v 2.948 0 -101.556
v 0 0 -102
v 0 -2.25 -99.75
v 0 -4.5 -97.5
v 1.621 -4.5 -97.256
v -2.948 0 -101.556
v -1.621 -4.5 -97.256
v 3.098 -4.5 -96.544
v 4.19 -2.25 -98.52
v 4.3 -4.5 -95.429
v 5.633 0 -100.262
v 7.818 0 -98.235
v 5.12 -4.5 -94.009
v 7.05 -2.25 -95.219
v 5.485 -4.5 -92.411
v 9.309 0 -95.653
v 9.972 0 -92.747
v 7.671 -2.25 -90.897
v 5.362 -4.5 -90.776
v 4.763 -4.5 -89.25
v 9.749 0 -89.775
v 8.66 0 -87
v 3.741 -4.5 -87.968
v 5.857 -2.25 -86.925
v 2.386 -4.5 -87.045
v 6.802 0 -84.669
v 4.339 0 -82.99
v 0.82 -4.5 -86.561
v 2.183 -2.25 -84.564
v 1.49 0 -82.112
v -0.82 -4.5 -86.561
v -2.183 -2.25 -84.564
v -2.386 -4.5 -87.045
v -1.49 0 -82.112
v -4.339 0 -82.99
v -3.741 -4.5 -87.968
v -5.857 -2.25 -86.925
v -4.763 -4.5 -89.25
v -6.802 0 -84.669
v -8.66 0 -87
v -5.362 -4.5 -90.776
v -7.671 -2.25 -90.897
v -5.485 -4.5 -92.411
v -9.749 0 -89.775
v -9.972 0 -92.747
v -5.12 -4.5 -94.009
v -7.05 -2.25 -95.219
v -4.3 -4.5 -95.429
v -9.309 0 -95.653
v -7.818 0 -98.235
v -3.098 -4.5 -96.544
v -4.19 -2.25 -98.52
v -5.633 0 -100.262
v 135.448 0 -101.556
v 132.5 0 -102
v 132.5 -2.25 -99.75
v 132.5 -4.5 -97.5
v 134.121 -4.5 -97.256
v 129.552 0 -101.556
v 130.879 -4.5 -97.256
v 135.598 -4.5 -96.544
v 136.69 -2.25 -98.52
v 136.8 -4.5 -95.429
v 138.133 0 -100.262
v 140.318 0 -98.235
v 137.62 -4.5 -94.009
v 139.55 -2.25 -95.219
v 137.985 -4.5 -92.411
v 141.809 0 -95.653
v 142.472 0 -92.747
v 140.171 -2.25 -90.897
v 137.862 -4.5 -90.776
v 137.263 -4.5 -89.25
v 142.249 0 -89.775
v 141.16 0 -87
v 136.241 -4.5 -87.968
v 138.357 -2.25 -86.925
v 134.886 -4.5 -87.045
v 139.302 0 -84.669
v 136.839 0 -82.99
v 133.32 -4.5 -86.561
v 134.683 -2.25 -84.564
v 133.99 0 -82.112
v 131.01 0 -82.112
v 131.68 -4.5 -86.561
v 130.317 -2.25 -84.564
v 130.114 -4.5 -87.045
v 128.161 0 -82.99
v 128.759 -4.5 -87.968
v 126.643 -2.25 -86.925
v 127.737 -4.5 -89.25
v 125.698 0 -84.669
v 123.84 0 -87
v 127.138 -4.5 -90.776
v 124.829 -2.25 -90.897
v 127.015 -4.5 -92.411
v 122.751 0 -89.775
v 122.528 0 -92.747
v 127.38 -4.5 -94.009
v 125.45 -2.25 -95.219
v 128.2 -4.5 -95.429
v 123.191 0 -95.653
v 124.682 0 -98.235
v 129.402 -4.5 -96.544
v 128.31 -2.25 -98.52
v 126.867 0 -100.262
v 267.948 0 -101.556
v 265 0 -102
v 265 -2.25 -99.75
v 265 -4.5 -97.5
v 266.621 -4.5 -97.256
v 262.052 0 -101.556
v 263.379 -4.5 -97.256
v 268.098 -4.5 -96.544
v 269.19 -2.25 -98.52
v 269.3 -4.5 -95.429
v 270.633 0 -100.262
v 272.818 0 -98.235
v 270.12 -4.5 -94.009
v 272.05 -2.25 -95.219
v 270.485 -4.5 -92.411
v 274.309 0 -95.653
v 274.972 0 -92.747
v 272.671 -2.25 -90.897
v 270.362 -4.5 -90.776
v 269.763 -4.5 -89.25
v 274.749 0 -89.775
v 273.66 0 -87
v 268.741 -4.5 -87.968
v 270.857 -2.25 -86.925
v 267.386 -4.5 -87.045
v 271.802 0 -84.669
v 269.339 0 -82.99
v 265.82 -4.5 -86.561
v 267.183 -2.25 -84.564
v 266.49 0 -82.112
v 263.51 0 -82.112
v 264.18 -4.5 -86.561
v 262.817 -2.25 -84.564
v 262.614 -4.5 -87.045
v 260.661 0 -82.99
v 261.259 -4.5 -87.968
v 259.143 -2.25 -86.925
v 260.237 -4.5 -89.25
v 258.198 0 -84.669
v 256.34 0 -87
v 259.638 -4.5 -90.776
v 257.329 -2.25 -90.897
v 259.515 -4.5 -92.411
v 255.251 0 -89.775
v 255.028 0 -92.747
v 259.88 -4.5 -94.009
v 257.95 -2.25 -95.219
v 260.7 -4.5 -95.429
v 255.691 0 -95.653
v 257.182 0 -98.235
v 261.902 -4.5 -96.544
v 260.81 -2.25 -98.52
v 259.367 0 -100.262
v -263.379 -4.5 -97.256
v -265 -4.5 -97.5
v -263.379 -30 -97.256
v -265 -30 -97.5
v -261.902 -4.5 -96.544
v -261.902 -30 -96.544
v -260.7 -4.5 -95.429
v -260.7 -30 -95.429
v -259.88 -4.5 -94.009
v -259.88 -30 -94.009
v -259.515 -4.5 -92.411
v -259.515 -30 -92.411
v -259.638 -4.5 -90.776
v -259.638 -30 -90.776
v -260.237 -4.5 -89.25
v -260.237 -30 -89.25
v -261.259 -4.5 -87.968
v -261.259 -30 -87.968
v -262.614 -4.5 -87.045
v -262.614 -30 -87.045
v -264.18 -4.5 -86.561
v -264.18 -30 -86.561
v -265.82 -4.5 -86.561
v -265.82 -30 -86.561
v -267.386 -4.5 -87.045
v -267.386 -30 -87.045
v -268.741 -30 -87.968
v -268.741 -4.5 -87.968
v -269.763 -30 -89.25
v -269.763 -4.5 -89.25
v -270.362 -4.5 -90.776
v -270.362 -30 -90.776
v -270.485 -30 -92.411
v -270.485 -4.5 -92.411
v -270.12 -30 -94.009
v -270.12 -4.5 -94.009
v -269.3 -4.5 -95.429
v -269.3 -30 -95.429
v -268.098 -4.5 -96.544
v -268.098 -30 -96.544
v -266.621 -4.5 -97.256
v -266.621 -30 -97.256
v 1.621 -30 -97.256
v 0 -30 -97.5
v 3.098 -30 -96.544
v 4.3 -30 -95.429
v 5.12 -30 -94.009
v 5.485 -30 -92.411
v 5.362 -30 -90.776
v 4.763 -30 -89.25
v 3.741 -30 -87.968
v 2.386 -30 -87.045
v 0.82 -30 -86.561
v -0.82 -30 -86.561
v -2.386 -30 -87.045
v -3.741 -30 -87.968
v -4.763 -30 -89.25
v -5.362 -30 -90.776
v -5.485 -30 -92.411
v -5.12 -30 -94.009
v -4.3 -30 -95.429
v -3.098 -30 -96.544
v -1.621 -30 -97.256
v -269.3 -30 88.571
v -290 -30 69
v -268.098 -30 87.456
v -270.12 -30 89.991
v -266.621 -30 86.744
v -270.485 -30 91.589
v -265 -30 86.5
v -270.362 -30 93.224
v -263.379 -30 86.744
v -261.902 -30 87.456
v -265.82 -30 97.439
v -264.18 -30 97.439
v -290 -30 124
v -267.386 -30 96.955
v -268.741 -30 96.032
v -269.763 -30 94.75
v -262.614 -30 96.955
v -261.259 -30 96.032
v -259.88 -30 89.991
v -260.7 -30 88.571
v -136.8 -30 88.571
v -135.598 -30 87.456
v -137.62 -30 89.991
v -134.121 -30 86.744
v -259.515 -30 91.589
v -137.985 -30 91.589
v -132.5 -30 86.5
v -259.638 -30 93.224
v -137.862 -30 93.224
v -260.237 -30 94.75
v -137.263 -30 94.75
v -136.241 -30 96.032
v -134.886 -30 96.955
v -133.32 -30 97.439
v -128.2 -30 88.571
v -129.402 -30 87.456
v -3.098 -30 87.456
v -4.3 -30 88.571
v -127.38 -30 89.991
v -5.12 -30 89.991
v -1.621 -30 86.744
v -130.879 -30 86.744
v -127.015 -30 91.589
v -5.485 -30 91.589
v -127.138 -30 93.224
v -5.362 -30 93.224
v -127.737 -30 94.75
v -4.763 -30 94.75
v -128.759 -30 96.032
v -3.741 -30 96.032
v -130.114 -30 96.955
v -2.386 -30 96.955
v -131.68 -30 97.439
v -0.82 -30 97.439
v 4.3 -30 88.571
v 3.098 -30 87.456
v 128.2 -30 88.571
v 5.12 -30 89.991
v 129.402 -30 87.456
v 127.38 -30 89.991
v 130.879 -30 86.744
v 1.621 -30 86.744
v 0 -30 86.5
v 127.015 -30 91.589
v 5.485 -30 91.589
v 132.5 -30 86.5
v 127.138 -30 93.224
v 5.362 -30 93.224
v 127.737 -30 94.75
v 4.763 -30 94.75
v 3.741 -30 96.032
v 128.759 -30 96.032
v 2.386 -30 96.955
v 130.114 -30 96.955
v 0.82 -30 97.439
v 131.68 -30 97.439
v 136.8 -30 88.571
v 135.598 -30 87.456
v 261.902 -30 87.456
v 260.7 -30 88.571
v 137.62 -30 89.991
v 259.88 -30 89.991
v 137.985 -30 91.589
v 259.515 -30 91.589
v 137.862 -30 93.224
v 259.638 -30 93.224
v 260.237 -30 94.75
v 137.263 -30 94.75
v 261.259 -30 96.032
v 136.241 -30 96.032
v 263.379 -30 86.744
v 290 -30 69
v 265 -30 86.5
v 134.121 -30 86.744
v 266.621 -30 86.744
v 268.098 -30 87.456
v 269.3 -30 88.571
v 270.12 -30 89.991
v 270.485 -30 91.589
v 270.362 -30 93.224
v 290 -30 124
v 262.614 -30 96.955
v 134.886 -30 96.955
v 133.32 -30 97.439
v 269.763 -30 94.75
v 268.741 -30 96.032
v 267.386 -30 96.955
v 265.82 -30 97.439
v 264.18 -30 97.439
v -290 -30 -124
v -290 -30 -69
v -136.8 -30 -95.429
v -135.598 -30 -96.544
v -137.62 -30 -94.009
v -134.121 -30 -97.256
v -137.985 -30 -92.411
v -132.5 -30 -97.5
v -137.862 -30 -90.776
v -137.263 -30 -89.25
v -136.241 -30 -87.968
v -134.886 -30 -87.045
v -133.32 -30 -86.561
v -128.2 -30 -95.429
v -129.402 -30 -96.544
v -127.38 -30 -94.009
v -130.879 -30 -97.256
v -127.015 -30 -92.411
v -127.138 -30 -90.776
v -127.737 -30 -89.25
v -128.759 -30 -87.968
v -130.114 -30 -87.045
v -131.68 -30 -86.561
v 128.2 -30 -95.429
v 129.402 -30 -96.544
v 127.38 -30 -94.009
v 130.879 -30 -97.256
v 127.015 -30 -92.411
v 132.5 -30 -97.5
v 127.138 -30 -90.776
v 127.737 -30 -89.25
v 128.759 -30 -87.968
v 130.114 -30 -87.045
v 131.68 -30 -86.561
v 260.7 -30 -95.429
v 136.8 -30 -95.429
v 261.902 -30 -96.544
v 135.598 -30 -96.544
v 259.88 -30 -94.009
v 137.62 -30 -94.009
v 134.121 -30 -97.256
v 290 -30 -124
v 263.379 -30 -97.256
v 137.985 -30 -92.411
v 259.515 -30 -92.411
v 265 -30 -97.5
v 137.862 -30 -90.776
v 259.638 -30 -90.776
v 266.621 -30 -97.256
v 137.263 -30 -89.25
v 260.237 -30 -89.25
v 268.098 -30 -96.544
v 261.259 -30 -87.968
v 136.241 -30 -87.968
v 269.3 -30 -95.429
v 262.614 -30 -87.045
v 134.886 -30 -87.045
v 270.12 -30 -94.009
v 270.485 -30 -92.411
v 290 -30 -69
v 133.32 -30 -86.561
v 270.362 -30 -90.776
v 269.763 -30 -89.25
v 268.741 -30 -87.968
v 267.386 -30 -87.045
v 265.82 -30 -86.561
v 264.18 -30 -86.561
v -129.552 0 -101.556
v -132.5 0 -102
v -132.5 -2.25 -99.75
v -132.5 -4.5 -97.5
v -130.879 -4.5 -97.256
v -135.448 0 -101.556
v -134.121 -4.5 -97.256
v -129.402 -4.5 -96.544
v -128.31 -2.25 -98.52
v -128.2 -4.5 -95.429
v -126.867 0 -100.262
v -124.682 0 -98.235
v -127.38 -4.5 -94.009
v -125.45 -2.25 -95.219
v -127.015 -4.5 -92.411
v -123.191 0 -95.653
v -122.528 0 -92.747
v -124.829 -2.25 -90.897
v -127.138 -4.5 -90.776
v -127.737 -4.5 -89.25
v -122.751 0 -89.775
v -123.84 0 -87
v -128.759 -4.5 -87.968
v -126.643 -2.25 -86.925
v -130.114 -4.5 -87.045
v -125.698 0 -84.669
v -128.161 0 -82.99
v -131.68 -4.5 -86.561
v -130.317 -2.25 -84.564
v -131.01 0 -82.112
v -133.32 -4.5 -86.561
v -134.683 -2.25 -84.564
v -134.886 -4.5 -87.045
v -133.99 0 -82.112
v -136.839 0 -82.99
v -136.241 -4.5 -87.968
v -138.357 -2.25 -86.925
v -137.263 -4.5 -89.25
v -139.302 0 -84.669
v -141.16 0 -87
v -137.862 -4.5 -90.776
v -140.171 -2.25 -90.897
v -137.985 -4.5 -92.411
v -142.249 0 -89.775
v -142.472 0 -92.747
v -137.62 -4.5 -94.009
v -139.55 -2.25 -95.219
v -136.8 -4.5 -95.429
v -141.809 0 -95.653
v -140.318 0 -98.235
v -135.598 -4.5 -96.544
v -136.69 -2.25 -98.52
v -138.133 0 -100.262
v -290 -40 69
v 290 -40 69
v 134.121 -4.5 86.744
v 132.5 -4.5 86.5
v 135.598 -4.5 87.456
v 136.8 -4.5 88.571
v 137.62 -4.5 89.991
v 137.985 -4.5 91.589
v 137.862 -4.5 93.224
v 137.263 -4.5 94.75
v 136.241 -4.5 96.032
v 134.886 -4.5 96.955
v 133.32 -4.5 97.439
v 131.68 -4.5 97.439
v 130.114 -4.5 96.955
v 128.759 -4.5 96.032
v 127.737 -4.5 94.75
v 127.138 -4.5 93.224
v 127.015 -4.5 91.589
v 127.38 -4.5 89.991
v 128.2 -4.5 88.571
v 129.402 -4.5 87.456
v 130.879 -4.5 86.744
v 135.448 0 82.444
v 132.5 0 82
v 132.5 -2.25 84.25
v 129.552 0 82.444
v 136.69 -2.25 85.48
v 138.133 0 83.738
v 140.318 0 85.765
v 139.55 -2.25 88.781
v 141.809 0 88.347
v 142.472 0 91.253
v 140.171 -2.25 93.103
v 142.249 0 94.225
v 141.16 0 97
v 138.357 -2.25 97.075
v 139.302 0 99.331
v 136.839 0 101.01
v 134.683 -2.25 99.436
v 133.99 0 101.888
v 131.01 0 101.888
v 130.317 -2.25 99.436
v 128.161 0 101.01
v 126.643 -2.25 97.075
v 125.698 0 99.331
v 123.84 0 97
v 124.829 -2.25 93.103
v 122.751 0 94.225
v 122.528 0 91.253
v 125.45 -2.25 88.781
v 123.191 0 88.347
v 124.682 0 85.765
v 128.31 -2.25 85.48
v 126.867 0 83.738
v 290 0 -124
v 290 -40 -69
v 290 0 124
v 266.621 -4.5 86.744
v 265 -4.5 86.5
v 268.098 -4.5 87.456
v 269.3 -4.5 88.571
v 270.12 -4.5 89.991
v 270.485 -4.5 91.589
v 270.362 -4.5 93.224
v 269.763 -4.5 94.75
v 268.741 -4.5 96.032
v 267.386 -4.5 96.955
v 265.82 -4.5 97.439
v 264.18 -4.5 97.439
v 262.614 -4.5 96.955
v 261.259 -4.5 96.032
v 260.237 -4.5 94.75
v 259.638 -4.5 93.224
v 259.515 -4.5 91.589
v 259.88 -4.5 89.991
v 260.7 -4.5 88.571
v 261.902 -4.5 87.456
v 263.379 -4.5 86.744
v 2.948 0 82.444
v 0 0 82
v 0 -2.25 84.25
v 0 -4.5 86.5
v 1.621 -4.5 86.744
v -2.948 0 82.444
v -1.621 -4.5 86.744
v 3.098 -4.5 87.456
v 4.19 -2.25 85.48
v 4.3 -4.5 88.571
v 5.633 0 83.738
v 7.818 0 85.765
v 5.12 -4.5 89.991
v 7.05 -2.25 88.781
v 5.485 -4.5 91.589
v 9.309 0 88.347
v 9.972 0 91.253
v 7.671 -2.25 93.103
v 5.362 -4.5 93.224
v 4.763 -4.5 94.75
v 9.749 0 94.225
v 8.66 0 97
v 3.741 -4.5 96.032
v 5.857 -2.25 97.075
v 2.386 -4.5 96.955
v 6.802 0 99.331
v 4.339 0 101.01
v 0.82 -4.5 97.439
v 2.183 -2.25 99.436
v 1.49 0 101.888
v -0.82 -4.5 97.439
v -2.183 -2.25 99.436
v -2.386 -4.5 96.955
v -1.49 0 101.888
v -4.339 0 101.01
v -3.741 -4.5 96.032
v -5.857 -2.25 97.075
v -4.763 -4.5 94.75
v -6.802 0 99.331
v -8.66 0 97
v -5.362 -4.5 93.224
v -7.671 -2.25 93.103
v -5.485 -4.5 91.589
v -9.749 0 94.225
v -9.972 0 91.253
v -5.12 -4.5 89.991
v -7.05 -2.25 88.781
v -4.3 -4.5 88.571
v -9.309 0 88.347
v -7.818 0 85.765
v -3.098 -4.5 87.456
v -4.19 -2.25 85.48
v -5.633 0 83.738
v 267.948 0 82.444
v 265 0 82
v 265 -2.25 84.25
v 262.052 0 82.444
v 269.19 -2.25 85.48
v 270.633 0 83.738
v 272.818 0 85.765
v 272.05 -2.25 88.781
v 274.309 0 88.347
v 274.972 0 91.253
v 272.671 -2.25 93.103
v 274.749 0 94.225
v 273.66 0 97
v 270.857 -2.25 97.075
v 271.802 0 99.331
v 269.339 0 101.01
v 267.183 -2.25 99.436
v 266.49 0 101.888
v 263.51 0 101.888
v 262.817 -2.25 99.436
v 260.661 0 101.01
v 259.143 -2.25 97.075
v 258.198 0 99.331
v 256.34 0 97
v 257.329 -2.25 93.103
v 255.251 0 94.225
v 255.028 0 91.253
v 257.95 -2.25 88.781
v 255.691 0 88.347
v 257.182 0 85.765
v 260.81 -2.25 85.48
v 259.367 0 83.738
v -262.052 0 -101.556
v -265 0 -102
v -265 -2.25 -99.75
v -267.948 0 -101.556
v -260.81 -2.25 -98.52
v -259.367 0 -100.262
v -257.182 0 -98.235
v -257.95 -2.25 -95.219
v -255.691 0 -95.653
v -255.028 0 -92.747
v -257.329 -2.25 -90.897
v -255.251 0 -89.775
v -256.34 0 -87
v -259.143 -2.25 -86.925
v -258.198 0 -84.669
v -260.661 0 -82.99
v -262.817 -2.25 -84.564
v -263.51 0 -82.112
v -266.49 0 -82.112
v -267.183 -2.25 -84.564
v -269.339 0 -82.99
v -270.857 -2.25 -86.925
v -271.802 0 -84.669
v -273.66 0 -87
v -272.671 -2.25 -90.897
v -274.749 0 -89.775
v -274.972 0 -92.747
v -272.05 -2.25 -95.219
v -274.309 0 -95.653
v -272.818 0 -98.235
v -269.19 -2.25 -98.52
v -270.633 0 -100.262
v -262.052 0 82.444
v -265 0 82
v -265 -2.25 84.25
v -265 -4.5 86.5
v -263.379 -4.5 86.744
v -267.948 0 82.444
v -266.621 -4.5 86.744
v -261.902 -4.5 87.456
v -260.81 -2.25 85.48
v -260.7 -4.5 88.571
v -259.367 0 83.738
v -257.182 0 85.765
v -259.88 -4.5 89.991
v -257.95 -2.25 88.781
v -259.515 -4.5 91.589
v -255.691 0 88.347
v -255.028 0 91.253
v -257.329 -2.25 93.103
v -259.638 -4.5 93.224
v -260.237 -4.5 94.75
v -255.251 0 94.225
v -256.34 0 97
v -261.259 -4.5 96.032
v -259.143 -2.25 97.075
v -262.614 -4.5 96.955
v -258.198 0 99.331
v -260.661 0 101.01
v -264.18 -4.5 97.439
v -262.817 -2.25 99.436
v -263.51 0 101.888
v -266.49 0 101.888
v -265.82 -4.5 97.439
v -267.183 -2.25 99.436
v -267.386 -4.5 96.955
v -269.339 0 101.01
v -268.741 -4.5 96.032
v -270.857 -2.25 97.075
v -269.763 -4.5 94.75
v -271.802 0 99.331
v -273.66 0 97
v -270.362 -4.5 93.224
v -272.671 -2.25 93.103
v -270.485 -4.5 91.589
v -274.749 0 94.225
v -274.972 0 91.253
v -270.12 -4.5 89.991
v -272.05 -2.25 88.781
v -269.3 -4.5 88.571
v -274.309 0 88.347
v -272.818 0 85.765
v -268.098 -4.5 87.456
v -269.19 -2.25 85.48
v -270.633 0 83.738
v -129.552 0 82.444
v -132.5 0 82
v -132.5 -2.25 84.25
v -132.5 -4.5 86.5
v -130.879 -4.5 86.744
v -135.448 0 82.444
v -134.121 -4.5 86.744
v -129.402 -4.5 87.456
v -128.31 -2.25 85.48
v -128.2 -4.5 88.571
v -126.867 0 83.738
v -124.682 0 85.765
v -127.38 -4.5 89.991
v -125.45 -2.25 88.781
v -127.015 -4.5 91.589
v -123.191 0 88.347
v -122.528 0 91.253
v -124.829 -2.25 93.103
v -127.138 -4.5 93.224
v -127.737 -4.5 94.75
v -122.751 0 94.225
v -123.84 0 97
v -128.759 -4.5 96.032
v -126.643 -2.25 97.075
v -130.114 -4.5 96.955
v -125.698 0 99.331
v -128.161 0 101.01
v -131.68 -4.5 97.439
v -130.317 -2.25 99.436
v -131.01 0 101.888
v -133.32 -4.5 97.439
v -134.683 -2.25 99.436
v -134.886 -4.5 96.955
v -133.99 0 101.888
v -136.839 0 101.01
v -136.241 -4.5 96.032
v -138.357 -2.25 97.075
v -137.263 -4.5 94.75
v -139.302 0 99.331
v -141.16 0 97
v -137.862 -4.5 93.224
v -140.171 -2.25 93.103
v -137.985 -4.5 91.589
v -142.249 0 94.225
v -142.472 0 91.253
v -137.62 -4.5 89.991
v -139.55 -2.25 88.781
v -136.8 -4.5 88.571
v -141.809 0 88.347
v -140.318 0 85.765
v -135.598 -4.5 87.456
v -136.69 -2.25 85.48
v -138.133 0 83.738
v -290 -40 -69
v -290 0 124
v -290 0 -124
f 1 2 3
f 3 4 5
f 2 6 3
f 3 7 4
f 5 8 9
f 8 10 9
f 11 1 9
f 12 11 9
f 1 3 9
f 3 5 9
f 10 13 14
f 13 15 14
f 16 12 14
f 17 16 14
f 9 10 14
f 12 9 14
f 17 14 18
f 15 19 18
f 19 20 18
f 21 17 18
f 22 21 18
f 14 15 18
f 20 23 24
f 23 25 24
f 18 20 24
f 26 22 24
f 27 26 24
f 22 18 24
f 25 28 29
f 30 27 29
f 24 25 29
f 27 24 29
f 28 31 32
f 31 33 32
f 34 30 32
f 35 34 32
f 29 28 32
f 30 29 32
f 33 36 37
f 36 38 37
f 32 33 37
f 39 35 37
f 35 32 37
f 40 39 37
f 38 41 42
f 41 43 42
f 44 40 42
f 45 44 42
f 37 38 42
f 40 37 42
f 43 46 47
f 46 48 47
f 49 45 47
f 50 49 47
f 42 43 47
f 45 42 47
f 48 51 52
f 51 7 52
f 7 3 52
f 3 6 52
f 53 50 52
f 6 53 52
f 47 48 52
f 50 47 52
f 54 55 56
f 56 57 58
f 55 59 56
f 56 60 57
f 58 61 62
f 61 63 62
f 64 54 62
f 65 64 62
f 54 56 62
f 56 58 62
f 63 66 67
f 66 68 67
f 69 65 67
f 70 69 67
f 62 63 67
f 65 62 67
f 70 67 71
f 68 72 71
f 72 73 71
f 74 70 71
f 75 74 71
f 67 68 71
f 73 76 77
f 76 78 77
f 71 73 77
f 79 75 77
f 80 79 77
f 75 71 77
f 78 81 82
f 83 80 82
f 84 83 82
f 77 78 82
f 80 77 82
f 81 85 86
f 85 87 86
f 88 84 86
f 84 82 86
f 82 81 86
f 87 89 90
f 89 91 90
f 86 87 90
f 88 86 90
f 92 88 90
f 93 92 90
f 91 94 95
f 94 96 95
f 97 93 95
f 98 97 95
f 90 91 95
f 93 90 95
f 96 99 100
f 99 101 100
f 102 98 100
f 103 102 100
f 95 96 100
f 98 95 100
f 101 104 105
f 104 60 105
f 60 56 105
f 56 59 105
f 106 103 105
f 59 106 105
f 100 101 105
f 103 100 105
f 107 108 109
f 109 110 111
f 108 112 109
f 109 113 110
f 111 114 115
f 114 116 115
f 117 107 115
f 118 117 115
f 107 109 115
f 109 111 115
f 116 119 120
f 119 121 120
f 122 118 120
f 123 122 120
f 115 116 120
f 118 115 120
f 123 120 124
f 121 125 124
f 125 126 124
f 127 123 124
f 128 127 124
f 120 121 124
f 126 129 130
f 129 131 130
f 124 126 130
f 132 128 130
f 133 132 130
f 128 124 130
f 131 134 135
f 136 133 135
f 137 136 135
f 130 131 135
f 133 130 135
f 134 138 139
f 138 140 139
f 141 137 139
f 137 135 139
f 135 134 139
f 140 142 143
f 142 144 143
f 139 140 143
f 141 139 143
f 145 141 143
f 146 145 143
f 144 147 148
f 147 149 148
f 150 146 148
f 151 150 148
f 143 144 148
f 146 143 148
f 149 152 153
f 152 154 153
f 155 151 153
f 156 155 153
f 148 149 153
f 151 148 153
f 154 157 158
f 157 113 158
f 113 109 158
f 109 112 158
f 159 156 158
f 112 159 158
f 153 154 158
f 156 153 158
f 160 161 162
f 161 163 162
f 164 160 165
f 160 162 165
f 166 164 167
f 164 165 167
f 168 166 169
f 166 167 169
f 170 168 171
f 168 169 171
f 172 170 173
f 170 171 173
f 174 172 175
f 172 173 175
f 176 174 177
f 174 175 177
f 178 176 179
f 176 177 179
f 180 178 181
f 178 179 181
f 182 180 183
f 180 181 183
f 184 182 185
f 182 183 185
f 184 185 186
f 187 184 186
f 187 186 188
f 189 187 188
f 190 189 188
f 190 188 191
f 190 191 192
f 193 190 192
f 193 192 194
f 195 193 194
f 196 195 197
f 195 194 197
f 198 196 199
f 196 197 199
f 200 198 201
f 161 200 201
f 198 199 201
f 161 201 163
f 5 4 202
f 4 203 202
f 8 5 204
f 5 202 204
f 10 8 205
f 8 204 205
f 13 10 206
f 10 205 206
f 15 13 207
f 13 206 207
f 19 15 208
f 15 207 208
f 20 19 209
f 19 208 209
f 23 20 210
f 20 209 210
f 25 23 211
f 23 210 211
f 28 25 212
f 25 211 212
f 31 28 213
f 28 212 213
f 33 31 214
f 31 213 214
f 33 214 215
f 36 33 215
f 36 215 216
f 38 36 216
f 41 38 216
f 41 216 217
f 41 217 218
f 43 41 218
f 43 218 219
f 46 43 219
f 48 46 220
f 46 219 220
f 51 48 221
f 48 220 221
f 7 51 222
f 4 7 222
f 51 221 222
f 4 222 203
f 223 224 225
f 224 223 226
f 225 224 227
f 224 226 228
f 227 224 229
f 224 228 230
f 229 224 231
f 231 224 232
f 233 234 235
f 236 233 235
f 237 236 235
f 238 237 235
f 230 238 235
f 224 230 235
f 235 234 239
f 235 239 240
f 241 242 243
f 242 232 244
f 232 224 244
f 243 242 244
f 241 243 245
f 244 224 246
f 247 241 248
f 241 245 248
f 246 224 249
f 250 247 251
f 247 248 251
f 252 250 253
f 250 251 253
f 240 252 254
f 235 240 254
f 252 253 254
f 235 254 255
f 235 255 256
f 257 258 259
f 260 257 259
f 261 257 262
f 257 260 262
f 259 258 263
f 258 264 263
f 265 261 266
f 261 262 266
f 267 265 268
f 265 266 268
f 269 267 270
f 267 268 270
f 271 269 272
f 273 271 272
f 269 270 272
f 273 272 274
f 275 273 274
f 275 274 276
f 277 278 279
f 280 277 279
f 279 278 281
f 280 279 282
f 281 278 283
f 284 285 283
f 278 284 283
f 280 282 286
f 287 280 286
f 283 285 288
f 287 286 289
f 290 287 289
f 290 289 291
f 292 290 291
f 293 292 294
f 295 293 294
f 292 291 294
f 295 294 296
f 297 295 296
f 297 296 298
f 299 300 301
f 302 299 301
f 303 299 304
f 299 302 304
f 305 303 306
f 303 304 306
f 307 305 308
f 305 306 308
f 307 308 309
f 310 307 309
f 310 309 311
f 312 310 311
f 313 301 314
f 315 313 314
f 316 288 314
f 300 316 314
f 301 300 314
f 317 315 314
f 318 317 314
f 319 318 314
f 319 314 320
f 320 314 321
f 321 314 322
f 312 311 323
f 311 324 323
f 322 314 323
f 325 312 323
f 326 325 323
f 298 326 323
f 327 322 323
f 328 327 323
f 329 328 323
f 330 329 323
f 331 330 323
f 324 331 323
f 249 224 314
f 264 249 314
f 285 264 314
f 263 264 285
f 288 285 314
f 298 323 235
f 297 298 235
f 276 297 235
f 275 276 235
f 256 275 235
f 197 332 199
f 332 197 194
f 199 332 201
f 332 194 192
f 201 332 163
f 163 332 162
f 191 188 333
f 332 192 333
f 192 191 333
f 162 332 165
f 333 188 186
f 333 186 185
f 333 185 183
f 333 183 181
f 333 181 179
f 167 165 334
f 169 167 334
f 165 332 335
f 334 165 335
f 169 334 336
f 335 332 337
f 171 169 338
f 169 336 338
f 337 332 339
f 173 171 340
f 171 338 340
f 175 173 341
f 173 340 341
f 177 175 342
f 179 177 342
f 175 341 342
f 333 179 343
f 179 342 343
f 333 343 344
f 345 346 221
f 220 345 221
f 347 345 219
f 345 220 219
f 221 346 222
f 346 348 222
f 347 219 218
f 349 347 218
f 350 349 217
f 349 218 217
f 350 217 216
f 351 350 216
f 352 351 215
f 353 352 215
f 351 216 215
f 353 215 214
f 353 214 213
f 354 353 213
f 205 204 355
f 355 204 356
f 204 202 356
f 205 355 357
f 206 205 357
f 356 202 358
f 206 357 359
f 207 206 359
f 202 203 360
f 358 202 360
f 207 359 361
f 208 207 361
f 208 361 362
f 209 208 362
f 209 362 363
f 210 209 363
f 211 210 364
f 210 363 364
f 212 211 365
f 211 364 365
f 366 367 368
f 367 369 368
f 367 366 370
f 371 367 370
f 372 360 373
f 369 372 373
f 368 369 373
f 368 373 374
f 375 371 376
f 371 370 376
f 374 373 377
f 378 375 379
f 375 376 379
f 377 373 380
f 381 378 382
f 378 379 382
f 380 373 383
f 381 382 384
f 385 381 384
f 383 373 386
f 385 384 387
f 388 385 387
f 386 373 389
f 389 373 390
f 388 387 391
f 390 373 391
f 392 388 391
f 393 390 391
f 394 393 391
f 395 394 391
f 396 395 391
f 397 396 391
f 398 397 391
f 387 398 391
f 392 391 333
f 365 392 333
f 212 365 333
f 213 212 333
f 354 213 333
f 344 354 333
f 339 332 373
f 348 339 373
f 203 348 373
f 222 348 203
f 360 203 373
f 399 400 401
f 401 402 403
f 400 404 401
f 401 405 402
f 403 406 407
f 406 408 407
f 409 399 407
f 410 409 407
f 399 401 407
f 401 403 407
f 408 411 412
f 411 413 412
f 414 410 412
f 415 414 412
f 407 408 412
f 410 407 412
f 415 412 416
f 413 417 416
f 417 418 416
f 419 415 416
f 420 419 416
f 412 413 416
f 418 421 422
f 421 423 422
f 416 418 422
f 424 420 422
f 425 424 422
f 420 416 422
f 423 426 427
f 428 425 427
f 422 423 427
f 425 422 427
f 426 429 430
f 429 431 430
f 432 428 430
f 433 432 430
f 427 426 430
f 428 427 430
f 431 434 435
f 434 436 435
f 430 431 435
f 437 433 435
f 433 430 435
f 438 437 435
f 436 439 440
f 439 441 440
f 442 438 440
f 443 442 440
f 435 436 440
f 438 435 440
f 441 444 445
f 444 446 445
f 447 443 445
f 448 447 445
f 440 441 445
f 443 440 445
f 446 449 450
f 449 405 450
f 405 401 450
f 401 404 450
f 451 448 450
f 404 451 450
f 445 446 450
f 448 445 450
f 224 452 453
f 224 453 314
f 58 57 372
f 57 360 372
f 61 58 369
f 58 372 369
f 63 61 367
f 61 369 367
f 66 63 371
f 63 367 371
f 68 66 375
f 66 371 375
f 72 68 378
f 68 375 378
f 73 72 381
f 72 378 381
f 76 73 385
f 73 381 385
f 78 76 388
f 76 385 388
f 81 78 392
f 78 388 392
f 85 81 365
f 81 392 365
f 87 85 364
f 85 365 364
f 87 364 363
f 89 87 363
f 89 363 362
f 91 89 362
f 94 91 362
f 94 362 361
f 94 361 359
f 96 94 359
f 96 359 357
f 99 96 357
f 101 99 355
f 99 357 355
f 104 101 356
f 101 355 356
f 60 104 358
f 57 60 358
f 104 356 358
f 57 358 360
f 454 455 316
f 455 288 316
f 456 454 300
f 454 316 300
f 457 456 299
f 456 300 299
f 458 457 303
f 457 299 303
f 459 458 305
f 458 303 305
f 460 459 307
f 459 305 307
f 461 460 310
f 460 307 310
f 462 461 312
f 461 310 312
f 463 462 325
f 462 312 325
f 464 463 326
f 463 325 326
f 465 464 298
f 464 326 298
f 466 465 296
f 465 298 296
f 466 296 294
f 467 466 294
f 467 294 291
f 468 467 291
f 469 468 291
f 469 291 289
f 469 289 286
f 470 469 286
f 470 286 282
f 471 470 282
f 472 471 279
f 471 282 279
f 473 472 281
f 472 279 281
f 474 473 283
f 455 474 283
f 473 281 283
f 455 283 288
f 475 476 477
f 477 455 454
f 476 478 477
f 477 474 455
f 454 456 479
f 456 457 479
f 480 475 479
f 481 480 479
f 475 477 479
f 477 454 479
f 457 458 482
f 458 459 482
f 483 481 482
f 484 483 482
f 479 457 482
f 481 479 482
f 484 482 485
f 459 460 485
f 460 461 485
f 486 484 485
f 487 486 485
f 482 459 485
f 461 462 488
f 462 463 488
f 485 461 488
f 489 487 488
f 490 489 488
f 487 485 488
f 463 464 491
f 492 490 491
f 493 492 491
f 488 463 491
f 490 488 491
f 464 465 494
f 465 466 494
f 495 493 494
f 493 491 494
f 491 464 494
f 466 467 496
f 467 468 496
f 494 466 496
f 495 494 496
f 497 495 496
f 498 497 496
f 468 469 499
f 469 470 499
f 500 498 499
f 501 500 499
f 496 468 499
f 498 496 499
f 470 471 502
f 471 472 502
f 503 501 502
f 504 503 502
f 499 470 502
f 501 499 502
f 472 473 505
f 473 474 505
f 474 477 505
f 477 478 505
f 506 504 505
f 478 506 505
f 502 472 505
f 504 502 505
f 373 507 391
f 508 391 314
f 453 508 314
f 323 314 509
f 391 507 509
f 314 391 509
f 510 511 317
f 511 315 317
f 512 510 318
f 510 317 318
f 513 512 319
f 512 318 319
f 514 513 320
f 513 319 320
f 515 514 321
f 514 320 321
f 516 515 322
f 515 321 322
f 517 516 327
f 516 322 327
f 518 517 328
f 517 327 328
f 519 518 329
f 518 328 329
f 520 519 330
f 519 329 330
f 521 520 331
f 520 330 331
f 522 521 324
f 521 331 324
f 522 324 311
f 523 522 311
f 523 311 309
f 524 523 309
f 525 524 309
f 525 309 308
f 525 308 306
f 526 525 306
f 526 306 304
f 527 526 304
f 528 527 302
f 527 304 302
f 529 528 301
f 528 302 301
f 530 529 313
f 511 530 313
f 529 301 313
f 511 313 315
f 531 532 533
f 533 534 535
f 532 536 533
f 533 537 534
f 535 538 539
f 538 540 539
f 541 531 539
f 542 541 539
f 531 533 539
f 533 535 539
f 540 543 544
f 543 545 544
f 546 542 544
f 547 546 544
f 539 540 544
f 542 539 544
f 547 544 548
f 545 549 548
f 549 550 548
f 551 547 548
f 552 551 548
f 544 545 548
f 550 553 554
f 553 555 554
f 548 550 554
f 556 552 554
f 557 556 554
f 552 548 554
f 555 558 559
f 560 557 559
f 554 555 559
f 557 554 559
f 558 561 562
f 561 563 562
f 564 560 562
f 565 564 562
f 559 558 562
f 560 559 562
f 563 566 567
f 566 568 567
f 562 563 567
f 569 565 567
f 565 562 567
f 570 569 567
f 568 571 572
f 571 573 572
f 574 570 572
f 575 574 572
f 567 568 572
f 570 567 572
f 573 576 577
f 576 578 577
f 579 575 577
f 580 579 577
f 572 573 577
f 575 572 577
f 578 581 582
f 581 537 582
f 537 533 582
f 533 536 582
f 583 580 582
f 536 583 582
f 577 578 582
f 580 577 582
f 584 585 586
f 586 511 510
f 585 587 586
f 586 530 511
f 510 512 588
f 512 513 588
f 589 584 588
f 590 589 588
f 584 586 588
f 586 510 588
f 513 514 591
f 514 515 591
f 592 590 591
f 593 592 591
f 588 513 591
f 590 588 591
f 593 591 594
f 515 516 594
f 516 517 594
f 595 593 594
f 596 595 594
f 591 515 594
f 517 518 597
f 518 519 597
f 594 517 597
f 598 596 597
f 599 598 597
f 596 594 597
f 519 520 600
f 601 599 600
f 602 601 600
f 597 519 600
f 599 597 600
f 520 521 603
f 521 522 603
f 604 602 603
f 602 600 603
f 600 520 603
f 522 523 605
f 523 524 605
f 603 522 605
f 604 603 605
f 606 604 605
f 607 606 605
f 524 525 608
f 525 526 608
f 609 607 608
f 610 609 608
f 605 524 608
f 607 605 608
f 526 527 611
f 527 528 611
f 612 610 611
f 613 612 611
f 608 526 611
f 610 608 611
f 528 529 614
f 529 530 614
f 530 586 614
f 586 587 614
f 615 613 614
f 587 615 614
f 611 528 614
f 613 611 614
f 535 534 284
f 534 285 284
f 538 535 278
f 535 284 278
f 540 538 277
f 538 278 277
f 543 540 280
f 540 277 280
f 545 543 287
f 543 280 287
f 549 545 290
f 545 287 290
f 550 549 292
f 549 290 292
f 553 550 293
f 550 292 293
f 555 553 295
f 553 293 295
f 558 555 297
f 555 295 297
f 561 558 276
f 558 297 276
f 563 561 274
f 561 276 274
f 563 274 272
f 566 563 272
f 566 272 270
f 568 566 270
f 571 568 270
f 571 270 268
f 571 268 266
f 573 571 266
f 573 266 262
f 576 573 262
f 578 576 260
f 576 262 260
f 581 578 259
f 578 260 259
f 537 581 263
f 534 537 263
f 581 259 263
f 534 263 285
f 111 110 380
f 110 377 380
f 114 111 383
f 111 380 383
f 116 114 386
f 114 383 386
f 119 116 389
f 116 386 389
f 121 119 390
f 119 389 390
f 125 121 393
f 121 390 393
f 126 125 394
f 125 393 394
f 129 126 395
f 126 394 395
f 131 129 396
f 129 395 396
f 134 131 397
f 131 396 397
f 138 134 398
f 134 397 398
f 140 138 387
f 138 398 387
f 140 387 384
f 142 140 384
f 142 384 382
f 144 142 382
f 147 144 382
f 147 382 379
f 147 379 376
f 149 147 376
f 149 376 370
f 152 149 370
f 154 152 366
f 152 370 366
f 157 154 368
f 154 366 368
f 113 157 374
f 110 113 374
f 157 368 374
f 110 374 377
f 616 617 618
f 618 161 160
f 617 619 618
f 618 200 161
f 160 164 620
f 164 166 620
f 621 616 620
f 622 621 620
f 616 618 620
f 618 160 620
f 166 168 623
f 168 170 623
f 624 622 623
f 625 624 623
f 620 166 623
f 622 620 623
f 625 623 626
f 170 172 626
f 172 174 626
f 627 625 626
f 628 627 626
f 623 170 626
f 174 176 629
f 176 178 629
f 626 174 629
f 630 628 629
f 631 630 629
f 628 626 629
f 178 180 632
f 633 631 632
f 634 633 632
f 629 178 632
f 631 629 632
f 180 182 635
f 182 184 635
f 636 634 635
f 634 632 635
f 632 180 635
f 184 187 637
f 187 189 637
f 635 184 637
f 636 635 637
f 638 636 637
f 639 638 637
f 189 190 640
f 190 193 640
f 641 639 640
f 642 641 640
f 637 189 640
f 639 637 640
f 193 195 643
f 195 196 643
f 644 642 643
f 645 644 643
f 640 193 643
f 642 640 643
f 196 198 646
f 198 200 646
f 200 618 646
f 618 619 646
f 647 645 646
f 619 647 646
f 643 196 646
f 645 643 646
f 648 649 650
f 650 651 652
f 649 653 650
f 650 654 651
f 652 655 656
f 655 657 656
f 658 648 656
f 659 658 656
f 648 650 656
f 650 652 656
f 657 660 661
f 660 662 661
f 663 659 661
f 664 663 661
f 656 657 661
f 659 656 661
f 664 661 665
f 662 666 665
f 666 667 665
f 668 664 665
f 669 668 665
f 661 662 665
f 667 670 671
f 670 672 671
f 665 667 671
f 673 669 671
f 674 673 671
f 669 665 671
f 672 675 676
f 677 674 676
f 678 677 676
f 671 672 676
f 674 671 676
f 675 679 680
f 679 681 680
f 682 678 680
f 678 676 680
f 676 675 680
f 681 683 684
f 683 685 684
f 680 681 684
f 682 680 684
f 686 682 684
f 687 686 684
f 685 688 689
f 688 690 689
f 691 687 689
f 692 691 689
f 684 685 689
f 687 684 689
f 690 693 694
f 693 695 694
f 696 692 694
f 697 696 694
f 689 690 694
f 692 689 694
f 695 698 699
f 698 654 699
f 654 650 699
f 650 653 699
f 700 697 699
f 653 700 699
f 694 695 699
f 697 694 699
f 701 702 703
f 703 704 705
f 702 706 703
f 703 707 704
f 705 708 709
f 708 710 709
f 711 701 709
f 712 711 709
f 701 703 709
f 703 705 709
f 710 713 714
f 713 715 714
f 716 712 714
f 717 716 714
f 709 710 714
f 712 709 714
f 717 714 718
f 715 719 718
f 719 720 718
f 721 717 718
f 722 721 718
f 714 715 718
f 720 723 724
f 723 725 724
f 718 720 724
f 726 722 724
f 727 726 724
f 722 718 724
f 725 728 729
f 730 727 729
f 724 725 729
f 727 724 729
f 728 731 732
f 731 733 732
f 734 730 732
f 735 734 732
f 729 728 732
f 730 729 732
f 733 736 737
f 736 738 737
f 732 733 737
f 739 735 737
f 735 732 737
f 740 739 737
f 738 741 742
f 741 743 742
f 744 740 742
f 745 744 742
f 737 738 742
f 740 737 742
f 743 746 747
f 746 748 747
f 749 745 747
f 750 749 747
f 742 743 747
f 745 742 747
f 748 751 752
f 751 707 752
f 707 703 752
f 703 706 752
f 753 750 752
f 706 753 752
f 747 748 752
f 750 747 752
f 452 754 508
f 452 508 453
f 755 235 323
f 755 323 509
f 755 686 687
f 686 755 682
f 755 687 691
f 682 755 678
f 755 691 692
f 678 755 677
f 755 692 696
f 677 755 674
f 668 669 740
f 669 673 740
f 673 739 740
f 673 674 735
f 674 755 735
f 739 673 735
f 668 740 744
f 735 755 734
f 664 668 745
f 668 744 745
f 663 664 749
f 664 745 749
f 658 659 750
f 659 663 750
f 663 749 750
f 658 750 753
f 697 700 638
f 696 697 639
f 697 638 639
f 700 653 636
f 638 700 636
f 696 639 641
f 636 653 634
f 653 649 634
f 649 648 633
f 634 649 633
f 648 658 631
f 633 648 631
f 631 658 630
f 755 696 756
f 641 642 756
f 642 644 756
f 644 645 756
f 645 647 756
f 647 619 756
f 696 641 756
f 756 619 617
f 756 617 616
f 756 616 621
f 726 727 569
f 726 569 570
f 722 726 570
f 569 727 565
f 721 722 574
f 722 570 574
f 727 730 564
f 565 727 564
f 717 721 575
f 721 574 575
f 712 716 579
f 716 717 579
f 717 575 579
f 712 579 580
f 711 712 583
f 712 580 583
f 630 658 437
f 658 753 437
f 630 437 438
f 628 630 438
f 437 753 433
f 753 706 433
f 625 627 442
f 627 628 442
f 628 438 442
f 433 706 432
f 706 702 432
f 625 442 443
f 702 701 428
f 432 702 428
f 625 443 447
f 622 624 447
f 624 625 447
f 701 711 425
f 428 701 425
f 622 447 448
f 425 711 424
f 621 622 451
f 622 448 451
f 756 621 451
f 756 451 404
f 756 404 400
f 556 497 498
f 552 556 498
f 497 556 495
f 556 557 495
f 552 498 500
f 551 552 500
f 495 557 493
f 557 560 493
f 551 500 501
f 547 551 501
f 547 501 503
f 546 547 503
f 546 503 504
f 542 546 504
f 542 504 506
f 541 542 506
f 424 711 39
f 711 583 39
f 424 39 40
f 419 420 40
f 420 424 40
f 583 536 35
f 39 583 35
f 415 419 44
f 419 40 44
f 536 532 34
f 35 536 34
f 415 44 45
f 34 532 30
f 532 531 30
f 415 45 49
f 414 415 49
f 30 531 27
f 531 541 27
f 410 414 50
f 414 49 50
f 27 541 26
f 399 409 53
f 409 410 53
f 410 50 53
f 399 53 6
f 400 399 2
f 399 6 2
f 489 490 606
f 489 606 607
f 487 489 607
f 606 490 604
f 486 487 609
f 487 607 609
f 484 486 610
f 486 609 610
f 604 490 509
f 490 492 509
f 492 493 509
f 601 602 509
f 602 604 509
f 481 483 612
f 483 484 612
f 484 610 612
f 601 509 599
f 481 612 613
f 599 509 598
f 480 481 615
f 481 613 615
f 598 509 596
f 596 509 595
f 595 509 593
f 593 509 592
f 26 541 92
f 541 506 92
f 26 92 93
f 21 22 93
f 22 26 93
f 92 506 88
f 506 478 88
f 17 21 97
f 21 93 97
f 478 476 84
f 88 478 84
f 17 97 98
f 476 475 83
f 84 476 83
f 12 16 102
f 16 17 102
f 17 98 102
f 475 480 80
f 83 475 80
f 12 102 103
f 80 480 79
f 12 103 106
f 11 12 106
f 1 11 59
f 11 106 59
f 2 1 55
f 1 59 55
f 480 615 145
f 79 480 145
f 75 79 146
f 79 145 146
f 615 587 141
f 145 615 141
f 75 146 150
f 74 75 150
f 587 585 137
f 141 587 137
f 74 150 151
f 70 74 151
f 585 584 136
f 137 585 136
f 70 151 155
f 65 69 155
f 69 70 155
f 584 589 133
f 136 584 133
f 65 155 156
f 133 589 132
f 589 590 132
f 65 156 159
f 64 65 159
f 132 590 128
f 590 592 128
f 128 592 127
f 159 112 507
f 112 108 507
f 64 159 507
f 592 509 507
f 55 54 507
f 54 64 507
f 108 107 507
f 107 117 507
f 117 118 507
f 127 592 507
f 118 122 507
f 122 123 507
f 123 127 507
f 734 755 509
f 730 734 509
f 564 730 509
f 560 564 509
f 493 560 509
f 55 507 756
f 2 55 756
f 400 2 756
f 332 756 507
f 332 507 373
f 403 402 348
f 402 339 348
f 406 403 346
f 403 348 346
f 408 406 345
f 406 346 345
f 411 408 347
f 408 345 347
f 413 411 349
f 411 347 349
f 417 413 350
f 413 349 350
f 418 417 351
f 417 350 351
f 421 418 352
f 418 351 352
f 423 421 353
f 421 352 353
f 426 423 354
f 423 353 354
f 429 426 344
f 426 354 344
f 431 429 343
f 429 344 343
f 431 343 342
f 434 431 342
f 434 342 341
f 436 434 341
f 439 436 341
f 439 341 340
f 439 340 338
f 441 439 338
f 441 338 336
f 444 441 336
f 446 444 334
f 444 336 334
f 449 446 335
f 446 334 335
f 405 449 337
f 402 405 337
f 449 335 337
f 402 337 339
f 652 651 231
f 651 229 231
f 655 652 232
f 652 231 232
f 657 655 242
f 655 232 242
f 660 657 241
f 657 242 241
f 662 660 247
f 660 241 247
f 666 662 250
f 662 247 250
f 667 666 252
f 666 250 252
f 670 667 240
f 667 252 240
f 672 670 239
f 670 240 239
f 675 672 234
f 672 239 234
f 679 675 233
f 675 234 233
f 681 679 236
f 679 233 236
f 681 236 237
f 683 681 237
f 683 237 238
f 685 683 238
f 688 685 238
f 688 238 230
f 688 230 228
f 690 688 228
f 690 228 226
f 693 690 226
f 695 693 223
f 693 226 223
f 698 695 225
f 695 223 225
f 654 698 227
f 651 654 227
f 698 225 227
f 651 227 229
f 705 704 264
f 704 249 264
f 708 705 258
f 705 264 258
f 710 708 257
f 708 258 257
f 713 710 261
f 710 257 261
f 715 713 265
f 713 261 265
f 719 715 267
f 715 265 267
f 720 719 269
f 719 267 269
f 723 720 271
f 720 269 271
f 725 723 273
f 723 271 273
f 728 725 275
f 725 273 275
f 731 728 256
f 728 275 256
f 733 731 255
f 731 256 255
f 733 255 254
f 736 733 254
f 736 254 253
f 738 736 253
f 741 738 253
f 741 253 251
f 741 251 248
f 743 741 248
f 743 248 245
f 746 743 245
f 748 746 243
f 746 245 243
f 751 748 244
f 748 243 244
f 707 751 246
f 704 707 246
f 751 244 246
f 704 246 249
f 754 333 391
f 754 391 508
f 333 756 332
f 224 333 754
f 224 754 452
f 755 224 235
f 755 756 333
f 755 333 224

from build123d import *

# Parameters (mm, degrees)
BOSS_EXTRUDE1_DEPTH                              = 290
CSK_FOR_M10_FLAT_HEAD_MACHINE_SCREW1_D           = 11
CSK_FOR_M10_FLAT_HEAD_MACHINE_SCREW1_DEPTH       = 55.695266595
CSK_FOR_M10_FLAT_HEAD_MACHINE_SCREW1_CSINK_D     = 20
CSK_FOR_M10_FLAT_HEAD_MACHINE_SCREW1_CSINK_ANGLE = 90
CSK_FOR_M10_FLAT_HEAD_MACHINE_SCREW1_TIP         = 3.304733405


with BuildPart() as part:
    # Sketch2 → Boss-Extrude1 (new, symmetric)
    with BuildSketch(Plane(origin=(0, 0, 0), x_dir=(0, 0, -1), z_dir=(1, 0, 0))):
        Polygon((-124, 0), (124, 0), (124, -30), (69, -30), (69, -40), (-69, -40), (-69, -30), (-124, -30), align=None)
    extrude(amount=BOSS_EXTRUDE1_DEPTH, both=True)

    # CSK for M10 Flat Head Machine Screw1
    with Locations(Plane(origin=(-265, 0, -92), x_dir=(0, 0, 1), z_dir=(0, 1, 0))):
        with Locations((0, 0), (0, 132.5), (0, 265), (0, 397.5), (0, 530), (184, 530), (184, 397.5), (184, 265), (184, 132.5), (184, 0)):
            CounterSinkHole(CSK_FOR_M10_FLAT_HEAD_MACHINE_SCREW1_D / 2, CSK_FOR_M10_FLAT_HEAD_MACHINE_SCREW1_CSINK_D / 2, depth=CSK_FOR_M10_FLAT_HEAD_MACHINE_SCREW1_DEPTH, counter_sink_angle=CSK_FOR_M10_FLAT_HEAD_MACHINE_SCREW1_CSINK_ANGLE)
            with Locations((0, 0, -(CSK_FOR_M10_FLAT_HEAD_MACHINE_SCREW1_DEPTH + CSK_FOR_M10_FLAT_HEAD_MACHINE_SCREW1_TIP / 2))):  # 118° drill point
                Cone(0, CSK_FOR_M10_FLAT_HEAD_MACHINE_SCREW1_D / 2, CSK_FOR_M10_FLAT_HEAD_MACHINE_SCREW1_TIP, mode=Mode.SUBTRACT)


solid = part.part
